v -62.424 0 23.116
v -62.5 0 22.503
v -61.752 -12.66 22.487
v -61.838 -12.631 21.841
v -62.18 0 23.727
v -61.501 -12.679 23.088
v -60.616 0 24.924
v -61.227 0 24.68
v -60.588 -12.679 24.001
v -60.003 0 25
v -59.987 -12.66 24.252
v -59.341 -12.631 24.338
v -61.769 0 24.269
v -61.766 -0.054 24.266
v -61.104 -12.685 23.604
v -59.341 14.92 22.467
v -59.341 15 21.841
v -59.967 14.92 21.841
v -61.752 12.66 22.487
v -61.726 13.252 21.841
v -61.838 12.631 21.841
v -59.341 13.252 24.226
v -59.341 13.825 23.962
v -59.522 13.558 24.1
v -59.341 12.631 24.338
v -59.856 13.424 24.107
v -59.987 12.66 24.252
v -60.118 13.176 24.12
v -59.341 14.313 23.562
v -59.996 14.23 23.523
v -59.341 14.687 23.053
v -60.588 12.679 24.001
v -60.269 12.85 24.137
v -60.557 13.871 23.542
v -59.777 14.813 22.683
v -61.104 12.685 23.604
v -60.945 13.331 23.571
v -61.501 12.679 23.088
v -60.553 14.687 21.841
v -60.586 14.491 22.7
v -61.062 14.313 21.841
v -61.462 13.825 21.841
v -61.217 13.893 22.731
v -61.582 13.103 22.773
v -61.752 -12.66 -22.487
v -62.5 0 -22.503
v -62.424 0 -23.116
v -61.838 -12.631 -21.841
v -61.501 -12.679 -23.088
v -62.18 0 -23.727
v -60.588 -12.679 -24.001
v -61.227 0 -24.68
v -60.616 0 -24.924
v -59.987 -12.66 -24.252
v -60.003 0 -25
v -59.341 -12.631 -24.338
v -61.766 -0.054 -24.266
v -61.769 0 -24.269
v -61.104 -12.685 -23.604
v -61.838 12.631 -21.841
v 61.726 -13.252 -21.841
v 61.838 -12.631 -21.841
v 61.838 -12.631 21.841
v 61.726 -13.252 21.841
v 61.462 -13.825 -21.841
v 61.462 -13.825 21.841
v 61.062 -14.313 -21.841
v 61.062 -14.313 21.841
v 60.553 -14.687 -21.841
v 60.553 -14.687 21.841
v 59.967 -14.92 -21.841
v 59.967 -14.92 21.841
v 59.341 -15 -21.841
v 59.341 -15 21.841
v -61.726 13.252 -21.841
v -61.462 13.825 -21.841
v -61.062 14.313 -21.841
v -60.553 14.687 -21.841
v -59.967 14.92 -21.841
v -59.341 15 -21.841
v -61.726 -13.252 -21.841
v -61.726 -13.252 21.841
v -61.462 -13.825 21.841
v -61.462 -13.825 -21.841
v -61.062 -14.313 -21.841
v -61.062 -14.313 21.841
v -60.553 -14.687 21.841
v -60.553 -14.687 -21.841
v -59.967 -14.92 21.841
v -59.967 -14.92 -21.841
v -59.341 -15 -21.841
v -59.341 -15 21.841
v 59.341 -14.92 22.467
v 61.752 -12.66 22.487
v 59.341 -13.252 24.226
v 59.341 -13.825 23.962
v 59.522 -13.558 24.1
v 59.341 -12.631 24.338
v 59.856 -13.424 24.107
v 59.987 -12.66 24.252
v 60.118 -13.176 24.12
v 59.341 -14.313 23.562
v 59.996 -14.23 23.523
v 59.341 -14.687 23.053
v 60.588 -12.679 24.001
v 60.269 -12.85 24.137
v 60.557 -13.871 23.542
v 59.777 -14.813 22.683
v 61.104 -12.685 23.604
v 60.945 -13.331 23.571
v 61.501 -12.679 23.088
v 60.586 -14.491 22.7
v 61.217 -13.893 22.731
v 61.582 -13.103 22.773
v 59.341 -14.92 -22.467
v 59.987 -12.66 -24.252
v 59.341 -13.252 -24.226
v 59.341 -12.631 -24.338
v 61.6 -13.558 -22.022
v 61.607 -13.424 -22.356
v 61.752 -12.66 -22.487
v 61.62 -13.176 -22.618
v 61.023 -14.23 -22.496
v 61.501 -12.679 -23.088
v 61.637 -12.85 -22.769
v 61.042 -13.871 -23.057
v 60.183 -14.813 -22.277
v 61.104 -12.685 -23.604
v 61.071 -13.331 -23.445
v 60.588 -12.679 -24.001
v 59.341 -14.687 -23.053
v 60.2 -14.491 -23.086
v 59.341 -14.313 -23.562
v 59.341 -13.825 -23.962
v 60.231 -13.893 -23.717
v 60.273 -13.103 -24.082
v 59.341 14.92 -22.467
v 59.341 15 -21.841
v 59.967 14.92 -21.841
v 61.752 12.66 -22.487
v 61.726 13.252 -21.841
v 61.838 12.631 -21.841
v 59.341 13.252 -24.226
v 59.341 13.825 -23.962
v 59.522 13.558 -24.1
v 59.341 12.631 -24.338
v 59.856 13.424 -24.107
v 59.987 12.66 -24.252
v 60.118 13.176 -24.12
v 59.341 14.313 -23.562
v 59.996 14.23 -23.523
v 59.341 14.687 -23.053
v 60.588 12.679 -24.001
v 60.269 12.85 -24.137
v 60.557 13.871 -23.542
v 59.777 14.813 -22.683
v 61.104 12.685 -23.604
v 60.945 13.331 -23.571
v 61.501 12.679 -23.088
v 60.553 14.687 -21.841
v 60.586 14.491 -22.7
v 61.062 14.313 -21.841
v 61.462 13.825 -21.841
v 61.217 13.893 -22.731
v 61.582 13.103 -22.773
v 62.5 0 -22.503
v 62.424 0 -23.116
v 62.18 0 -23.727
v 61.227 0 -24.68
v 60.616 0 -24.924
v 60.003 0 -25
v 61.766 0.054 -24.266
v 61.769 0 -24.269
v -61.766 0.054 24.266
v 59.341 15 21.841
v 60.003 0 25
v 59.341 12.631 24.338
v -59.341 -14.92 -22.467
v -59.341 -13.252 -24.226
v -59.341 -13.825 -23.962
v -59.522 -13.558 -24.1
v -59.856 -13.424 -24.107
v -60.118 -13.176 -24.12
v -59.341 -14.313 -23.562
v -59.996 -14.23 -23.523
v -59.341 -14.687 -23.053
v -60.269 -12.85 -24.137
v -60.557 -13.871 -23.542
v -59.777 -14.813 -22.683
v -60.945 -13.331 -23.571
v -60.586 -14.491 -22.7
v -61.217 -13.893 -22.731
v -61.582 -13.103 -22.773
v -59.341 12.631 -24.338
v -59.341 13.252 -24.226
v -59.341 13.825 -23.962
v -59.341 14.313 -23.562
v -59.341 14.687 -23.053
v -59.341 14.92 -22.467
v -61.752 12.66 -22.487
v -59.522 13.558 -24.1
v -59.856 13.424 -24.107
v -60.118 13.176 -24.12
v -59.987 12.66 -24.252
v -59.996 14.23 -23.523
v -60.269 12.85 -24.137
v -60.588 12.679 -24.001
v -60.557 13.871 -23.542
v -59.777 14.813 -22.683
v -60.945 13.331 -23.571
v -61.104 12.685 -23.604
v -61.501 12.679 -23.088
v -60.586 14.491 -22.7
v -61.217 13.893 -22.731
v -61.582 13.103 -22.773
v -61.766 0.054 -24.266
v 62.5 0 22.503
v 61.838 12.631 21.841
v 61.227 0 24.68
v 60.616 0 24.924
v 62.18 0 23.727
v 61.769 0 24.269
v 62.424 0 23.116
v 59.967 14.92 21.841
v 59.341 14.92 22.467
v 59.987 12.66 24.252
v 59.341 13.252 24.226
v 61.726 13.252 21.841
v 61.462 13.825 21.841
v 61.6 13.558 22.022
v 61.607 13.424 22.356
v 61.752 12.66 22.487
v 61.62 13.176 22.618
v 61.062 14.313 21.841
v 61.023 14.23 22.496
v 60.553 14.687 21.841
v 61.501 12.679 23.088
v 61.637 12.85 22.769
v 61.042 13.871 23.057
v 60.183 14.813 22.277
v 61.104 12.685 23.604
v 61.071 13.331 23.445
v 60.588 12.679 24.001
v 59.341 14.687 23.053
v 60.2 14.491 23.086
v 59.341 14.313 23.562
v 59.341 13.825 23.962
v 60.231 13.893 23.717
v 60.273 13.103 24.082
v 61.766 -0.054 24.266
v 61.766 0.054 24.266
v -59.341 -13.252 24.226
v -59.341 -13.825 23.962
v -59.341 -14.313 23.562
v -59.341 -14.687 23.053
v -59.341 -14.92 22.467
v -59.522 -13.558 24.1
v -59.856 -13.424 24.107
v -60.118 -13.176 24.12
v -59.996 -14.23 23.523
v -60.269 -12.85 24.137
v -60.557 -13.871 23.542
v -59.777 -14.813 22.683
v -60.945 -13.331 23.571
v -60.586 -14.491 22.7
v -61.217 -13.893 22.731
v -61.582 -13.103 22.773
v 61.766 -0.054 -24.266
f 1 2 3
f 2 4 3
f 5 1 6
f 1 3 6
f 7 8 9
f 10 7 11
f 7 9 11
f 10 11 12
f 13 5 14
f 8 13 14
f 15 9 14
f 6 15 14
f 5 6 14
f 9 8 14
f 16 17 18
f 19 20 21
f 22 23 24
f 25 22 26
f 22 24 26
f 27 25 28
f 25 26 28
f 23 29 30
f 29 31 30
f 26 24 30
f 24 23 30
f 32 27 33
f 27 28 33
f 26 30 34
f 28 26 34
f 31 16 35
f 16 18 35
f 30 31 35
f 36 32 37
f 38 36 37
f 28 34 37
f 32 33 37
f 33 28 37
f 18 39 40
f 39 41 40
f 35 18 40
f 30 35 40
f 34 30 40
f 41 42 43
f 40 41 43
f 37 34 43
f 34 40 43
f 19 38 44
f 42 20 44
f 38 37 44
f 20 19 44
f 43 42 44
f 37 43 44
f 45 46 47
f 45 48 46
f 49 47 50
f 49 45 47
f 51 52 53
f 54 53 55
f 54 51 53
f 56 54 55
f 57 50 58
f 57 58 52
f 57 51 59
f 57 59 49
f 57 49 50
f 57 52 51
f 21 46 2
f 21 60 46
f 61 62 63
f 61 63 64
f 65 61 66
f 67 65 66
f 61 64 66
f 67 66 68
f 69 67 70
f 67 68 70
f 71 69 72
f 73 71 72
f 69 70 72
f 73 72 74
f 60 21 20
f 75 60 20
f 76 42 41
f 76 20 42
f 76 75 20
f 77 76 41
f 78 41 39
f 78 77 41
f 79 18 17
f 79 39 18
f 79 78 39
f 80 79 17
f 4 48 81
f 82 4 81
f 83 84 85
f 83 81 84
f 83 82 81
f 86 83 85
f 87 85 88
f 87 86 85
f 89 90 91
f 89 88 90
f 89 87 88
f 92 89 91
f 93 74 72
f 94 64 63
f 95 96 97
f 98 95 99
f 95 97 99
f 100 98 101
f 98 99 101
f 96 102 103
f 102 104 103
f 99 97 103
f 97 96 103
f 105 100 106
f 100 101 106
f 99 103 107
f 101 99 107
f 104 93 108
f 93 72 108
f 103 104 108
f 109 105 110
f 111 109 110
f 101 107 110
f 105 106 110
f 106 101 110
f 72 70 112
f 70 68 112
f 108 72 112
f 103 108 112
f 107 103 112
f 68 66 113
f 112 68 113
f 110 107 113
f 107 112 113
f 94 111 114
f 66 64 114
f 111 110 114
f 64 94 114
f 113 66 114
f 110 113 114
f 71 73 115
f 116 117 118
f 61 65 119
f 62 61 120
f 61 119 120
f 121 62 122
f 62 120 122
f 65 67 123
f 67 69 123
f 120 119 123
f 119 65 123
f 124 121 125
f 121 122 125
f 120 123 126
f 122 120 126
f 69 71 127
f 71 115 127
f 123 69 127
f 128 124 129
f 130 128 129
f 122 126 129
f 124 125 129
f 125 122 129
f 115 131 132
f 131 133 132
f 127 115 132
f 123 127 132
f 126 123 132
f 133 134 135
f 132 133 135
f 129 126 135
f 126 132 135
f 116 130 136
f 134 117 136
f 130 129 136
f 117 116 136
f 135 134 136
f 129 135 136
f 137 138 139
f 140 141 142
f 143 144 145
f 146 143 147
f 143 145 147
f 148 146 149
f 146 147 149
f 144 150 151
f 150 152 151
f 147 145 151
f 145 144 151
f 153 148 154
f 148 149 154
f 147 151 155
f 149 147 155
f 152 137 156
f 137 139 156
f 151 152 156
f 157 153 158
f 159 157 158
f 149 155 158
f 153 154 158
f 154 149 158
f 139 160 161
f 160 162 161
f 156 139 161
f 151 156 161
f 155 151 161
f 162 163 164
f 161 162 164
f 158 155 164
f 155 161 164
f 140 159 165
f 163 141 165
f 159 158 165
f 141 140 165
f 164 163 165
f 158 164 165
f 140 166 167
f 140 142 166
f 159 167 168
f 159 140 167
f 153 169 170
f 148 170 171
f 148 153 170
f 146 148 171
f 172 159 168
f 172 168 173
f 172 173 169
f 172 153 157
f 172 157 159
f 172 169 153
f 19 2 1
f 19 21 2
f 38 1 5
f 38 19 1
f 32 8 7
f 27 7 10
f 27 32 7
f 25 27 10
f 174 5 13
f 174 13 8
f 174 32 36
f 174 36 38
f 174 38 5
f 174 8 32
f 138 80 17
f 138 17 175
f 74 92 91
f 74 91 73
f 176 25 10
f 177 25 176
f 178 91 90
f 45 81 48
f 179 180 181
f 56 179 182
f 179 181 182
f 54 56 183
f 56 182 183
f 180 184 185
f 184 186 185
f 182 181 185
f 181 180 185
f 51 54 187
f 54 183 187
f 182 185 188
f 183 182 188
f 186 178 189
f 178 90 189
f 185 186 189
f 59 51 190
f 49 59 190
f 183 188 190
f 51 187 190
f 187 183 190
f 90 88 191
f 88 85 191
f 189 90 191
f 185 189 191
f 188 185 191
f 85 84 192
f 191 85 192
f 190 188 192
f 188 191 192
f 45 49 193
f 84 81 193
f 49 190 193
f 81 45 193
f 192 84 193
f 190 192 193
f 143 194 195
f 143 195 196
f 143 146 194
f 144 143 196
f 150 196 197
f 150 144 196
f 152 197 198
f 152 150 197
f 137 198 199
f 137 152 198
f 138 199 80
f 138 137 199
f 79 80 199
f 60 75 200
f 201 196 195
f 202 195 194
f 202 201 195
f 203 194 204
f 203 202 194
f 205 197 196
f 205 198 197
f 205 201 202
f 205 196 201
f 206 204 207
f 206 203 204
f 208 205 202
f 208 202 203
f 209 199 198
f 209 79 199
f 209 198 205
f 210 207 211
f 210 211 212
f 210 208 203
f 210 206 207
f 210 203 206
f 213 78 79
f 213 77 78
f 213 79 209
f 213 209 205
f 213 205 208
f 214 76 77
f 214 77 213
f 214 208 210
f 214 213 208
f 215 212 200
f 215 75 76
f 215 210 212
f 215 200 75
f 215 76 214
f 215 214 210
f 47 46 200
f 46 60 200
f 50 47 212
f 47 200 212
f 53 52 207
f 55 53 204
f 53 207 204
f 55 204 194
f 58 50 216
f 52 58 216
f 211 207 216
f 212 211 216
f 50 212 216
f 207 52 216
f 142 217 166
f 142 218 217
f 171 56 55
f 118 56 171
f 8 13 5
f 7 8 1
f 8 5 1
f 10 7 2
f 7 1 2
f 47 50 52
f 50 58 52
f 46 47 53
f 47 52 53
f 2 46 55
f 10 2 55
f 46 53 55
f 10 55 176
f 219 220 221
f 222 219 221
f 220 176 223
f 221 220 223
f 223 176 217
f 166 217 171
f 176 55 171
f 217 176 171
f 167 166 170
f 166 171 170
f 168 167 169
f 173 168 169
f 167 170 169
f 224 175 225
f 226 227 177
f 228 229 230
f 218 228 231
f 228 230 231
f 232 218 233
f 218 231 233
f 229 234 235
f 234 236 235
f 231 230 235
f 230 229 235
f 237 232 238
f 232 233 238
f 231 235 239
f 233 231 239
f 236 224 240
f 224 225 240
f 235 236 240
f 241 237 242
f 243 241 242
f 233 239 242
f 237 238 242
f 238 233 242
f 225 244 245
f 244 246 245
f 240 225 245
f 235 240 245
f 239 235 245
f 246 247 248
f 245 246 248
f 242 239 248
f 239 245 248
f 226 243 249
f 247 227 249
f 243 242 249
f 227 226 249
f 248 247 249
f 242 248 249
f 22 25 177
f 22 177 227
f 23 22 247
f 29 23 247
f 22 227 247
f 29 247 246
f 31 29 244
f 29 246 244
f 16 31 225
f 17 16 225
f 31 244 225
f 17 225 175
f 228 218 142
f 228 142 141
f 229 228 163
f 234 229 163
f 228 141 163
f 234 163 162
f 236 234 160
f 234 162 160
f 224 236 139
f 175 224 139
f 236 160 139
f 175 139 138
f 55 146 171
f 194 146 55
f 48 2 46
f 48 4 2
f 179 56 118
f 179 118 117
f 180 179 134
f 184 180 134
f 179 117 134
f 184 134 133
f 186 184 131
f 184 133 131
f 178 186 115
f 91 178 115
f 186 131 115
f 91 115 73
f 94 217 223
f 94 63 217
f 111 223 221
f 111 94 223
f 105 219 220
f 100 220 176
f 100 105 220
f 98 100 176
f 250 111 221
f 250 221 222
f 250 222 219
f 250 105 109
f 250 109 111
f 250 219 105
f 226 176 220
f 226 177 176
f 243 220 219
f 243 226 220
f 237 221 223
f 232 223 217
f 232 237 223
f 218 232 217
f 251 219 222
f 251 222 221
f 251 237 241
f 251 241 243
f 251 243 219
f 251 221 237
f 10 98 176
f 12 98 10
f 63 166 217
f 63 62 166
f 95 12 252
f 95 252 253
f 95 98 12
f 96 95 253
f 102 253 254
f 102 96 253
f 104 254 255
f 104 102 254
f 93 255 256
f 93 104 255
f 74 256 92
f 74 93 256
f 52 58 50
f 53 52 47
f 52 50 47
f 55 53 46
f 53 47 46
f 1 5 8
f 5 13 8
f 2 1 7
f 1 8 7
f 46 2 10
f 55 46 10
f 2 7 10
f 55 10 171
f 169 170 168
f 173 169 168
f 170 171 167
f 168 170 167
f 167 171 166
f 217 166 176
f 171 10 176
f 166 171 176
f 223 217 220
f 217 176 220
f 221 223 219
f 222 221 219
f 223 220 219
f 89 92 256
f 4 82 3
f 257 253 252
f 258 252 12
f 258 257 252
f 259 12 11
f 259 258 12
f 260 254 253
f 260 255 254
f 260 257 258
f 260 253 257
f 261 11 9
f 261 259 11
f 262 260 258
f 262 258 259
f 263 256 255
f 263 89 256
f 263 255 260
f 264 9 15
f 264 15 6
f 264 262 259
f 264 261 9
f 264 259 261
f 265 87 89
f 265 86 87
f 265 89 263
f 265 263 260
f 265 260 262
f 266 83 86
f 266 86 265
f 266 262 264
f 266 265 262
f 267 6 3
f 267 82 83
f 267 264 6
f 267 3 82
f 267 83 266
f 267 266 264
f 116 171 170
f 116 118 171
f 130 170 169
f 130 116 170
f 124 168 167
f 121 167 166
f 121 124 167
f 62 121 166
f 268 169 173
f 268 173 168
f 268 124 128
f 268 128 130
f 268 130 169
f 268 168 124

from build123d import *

# Parameters (mm, degrees)
SKETCH1_W           = 125
SKETCH1_H           = 50
BOSS_EXTRUDE1_DEPTH = 15
BOSS_EXTRUDE1_TAPER = 3
FILLET1_R           = 2.5
SKETCH2_W           = 125
SKETCH2_H           = 50
BOSS_EXTRUDE2_DEPTH = 15
BOSS_EXTRUDE2_TAPER = 3
FILLET2_R           = 2.5


with BuildPart() as part:
    # Sketch1 → Boss-Extrude1 (new body)
    with BuildSketch(Plane(origin=(0, 0, 0), x_dir=(1, 0, 0), z_dir=(0, 1, 0))):
        Rectangle(SKETCH1_W, SKETCH1_H)
    extrude(amount=BOSS_EXTRUDE1_DEPTH, taper=BOSS_EXTRUDE1_TAPER)

    # Fillet1
    fillet1_edges = [part.edges().sort_by_distance(p)[0] for p in [
        (-61.713883311, 15, 0),
        (0, 15, 24.213883311),
        (61.713883311, 15, 0),
        (0, 15, -24.213883311),
        (62.106941655, 7.5, 24.606941655),
        (-62.106941655, 7.5, 24.606941655),
        (-62.106941655, 7.5, -24.606941655),
        (62.106941655, 7.5, -24.606941655),
    ]]
    fillet(fillet1_edges, radius=FILLET1_R)


with BuildPart() as body_2:
    # Sketch2 → Boss-Extrude2 (new body)
    with BuildSketch(Plane.XZ):
        Rectangle(SKETCH2_W, SKETCH2_H)
    extrude(amount=BOSS_EXTRUDE2_DEPTH, taper=BOSS_EXTRUDE2_TAPER)

    # Fillet2
    fillet2_edges = [body_2.edges().sort_by_distance(p)[0] for p in [
        (-61.713883311, -15, 0),
        (0, -15, -24.213883311),
        (61.713883311, -15, 0),
        (0, -15, 24.213883311),
        (62.106941655, -7.5, -24.606941655),
        (-62.106941655, -7.5, -24.606941655),
        (-62.106941655, -7.5, 24.606941655),
        (62.106941655, -7.5, 24.606941655),
    ]]
    fillet(fillet2_edges, radius=FILLET2_R)


solid = Compound([part.part, body_2.part])
